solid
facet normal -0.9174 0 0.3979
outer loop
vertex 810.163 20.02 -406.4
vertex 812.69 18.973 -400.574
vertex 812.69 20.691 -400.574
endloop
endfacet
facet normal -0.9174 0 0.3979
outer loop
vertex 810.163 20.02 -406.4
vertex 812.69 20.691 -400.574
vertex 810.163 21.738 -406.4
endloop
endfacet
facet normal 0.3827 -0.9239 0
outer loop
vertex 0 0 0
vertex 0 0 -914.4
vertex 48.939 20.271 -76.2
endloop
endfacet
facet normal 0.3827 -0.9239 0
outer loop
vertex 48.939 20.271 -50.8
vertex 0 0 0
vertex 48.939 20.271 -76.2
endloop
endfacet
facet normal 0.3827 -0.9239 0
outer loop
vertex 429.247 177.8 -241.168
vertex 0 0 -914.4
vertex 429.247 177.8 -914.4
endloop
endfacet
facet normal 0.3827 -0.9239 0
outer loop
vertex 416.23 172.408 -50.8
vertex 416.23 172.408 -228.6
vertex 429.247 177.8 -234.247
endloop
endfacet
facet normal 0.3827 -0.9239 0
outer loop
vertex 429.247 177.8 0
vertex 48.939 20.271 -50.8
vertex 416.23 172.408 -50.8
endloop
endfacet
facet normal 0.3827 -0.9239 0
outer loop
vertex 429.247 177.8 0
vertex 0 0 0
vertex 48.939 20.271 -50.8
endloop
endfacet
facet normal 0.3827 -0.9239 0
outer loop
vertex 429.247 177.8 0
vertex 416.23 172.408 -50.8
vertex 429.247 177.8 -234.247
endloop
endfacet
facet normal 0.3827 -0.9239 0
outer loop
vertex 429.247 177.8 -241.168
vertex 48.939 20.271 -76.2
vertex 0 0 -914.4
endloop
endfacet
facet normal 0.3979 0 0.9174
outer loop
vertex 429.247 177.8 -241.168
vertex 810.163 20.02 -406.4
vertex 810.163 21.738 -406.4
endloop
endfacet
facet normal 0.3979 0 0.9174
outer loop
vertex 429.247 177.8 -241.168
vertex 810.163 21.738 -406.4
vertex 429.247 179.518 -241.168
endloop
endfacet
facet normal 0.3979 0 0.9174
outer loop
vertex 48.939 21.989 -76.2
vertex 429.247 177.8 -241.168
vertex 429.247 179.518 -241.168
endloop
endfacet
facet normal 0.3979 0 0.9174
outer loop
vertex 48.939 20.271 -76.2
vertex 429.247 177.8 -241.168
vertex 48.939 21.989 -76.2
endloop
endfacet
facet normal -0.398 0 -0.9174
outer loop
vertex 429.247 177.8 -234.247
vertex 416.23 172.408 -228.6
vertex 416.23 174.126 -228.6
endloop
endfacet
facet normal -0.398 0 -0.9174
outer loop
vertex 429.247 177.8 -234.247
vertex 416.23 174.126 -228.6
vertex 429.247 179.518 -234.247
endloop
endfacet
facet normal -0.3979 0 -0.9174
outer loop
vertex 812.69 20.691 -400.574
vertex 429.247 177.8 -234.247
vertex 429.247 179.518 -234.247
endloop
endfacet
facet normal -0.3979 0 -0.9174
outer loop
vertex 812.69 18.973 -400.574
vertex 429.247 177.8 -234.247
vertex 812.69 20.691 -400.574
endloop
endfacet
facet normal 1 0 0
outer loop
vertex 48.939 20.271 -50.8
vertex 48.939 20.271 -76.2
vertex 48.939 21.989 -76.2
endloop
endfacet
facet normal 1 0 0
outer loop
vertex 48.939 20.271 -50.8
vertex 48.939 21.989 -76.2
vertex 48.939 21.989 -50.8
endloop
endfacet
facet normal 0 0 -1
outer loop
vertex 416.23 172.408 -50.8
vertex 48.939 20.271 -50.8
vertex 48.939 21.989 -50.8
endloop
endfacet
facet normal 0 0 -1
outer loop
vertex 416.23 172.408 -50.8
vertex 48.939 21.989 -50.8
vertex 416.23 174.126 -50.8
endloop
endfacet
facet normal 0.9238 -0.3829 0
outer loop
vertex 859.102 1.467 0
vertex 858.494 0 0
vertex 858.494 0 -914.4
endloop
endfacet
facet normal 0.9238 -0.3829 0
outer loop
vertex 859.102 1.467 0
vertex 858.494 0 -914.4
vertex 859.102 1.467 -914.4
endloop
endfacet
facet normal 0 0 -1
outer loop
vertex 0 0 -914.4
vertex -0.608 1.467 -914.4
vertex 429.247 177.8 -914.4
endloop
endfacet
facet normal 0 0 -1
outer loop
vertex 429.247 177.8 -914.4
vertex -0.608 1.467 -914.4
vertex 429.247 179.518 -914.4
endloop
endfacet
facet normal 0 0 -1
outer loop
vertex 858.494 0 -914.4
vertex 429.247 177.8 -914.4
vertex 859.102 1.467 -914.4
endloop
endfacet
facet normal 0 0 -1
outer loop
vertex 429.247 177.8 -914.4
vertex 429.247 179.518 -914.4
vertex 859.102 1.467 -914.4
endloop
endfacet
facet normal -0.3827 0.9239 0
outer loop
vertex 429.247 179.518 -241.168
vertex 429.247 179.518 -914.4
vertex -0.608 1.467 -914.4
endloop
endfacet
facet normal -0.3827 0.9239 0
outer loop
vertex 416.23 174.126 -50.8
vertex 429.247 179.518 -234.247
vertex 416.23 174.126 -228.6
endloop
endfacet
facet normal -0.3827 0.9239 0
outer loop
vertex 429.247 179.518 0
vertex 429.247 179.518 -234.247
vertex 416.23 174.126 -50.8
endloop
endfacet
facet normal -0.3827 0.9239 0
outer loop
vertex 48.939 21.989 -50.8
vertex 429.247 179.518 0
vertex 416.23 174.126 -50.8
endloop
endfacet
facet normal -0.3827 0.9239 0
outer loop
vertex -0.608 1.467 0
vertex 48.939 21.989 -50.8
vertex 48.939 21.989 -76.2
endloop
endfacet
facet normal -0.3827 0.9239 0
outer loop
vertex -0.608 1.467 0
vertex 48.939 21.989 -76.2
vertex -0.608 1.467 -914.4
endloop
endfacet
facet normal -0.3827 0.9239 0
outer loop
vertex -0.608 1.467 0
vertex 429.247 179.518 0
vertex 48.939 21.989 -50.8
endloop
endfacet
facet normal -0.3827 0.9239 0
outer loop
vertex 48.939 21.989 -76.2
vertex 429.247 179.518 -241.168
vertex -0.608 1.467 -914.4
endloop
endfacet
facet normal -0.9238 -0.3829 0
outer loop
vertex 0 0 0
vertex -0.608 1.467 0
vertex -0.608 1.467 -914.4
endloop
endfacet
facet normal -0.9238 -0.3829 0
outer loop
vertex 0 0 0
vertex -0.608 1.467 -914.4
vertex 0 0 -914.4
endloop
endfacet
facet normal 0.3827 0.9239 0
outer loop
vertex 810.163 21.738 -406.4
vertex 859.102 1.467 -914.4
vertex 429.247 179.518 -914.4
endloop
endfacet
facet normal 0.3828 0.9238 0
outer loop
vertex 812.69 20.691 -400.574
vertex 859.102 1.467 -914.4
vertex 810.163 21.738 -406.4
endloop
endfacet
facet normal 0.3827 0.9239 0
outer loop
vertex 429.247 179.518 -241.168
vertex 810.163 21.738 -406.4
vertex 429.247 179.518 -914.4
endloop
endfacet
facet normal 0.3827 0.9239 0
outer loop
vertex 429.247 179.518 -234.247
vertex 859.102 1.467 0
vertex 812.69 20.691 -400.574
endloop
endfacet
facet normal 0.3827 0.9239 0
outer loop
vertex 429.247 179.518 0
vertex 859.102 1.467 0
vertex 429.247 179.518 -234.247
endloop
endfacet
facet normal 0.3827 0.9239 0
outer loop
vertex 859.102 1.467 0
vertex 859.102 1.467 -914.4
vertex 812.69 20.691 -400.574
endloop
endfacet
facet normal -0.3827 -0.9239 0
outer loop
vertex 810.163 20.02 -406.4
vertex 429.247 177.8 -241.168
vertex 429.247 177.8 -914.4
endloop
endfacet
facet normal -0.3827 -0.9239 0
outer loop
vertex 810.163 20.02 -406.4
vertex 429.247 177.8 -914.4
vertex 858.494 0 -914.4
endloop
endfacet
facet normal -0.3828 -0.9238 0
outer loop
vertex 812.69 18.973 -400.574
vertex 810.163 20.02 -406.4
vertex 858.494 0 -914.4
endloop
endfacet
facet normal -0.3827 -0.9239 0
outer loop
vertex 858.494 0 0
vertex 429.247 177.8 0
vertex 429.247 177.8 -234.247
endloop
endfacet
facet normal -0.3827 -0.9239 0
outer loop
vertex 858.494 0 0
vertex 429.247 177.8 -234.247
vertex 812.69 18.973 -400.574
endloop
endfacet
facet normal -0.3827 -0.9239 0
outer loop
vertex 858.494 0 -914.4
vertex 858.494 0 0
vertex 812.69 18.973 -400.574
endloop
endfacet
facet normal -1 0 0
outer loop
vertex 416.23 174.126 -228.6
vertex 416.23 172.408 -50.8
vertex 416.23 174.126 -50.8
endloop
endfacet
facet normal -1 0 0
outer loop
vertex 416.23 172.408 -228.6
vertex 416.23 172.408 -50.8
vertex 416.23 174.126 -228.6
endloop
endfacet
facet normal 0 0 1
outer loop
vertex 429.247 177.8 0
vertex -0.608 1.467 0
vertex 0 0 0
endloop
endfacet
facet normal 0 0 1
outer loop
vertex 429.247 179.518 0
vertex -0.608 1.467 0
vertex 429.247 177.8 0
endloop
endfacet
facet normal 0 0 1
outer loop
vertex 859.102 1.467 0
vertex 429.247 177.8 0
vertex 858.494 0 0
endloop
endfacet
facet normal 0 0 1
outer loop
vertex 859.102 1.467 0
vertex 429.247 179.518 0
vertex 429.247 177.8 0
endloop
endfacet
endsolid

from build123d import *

# Parameters (mm, degrees)
F1_DEPTH = 914.4
F4_DEPTH = 178.052639


with BuildPart() as f1:
    # F0 (on Top) → F1 (new body)
    with BuildSketch(Plane.XY):
        Polygon((-0.60751, 1.466659), (0, 0), (429.247171, 177.8), (858.494343, 0), (859.101853, 1.466659), (429.247171, 179.518298), align=None)
    extrude(amount=-F1_DEPTH)

    # F3 (on face) → F4 (cut, through all)
    with BuildSketch(Plane(origin=(0, 1.466659, 0), x_dir=(-1, 0, 0), z_dir=(0, 1, 0))):
        Polygon((-810.162893, -406.4), (-48.93896, -76.2), (-48.93896, -50.8), (-416.229916, -50.8), (-416.229916, -228.6), (-812.689867, -400.574461), align=None)
    extrude(amount=F4_DEPTH, mode=Mode.SUBTRACT)


solid = f1.part
